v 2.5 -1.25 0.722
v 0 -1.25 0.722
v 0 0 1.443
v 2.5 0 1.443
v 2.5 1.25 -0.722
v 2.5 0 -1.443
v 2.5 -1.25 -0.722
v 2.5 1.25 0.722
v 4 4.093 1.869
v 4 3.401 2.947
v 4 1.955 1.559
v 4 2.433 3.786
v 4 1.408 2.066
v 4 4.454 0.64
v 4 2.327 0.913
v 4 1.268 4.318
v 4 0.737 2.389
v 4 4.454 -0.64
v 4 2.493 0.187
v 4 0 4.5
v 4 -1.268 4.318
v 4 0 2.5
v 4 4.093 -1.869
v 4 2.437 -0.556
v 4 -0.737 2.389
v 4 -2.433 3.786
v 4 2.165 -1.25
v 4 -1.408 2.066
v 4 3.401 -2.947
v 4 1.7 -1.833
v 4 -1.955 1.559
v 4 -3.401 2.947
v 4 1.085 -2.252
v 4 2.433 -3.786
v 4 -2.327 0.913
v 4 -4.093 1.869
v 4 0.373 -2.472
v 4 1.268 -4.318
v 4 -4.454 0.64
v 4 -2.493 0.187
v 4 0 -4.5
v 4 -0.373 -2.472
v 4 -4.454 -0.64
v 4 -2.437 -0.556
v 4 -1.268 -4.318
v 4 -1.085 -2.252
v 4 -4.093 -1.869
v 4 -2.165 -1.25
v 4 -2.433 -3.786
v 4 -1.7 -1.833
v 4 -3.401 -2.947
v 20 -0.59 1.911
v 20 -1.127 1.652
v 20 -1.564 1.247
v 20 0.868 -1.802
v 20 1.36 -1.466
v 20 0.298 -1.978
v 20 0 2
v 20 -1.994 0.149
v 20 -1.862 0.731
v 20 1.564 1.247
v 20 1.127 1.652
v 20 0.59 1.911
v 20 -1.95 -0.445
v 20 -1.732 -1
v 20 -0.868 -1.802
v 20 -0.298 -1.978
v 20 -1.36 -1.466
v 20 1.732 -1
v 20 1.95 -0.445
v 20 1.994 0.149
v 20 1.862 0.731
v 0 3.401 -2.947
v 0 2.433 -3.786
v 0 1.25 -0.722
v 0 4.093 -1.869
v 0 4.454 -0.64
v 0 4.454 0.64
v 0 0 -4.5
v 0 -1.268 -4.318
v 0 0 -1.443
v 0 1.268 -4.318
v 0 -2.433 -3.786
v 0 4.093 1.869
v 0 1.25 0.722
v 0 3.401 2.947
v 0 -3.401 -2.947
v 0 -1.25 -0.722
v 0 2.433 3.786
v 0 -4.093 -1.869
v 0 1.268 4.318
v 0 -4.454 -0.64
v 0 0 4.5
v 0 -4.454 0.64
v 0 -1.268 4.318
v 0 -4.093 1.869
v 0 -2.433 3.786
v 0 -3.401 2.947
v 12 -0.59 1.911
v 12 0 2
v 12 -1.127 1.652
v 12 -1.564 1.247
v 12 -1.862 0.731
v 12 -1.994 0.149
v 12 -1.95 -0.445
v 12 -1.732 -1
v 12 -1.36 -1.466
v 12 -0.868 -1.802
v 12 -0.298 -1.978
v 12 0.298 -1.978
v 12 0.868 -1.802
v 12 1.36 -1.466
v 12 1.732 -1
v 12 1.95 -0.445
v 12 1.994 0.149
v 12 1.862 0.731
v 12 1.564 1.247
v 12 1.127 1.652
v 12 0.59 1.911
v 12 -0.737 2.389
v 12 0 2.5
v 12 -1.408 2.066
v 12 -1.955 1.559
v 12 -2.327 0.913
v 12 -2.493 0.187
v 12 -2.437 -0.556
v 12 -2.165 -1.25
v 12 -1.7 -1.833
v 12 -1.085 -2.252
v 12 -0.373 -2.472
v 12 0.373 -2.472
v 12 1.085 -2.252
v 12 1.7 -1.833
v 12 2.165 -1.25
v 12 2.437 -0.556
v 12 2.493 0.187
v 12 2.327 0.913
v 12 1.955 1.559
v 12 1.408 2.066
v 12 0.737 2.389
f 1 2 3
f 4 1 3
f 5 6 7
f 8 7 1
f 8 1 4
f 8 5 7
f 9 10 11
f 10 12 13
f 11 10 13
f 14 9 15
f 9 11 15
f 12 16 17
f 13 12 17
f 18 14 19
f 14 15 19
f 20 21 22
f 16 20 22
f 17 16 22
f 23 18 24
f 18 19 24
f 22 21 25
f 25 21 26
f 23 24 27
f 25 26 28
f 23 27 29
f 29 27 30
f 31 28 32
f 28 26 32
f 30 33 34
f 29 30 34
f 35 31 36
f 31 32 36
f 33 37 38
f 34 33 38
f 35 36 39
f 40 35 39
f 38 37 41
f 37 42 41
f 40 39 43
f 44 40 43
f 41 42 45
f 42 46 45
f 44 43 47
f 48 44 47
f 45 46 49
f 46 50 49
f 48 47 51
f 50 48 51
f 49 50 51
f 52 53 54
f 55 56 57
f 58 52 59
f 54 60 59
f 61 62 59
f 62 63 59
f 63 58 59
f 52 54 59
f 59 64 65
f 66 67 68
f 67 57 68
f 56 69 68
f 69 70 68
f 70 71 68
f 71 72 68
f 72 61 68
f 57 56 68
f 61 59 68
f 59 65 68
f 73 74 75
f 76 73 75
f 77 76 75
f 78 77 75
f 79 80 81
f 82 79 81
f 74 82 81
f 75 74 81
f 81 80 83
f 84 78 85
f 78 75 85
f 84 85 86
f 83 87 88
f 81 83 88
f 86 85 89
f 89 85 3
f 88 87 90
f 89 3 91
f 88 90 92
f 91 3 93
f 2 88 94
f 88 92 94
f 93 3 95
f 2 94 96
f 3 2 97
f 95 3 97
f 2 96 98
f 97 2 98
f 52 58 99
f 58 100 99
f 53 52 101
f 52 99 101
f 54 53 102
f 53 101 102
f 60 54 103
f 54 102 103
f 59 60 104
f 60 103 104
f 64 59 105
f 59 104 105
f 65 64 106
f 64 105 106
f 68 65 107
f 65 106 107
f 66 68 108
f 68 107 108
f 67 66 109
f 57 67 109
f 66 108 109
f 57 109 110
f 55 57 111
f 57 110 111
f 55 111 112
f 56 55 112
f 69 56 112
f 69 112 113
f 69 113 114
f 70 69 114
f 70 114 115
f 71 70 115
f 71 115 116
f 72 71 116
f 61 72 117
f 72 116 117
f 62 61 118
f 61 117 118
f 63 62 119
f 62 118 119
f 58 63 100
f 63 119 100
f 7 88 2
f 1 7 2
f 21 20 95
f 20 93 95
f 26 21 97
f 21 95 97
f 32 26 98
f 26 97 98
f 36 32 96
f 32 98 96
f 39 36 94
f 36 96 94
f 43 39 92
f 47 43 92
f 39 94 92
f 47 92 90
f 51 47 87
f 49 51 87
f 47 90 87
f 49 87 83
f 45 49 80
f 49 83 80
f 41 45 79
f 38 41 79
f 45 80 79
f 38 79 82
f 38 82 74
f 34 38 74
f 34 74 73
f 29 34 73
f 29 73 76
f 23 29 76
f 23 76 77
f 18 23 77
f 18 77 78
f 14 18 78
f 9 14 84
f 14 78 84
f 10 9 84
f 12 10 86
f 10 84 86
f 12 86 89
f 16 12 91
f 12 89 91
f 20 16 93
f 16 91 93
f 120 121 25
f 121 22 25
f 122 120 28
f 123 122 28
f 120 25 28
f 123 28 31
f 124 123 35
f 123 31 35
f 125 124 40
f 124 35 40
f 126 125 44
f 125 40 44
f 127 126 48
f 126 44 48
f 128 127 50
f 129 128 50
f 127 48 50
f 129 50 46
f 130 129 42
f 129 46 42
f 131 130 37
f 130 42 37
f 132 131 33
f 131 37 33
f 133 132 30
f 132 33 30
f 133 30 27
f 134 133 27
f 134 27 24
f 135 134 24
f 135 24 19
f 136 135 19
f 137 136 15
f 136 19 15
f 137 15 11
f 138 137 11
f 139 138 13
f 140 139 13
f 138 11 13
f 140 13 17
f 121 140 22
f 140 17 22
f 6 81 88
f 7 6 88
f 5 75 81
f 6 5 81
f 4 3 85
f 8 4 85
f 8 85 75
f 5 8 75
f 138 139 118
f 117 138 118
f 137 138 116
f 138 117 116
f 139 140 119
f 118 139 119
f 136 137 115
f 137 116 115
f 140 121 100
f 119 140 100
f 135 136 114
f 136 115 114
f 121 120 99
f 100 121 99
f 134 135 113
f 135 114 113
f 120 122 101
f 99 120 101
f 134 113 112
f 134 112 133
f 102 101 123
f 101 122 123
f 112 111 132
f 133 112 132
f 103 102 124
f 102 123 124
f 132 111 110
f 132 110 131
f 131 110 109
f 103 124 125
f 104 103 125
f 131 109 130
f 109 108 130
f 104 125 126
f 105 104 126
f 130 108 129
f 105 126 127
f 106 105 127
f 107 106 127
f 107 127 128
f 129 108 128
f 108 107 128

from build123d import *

# Parameters (mm, degrees)
CUT_EXTRUDE1_DEPTH = 2.5


with BuildPart() as part:
    # Sketch1 → Revolve1 (revolve)
    with BuildSketch(Plane.XY, mode=Mode.PRIVATE) as revolve1_sk:
        Polygon((4, 4.5), (0, 4.5), (0, 0), (20, 0), (20, 2), (12, 2), (12, 2.5), (4, 2.5), align=None)
    revolve(revolve1_sk.sketch.rotate(Axis((-20, 0, 0), (1, 0, 0)), 90), axis=Axis((-20, 0, 0), (1, 0, 0)))

    # Sketch2 → Cut-Extrude1 (cut)
    with BuildSketch(Plane.ZY):
        Polygon((1.443375673, 0), (0.721687836, 1.25), (-0.721687836, 1.25), (-1.443375673, 0), (-0.721687836, -1.25), (0.721687836, -1.25), align=None)
    extrude(amount=-CUT_EXTRUDE1_DEPTH, mode=Mode.SUBTRACT)


solid = part.part
